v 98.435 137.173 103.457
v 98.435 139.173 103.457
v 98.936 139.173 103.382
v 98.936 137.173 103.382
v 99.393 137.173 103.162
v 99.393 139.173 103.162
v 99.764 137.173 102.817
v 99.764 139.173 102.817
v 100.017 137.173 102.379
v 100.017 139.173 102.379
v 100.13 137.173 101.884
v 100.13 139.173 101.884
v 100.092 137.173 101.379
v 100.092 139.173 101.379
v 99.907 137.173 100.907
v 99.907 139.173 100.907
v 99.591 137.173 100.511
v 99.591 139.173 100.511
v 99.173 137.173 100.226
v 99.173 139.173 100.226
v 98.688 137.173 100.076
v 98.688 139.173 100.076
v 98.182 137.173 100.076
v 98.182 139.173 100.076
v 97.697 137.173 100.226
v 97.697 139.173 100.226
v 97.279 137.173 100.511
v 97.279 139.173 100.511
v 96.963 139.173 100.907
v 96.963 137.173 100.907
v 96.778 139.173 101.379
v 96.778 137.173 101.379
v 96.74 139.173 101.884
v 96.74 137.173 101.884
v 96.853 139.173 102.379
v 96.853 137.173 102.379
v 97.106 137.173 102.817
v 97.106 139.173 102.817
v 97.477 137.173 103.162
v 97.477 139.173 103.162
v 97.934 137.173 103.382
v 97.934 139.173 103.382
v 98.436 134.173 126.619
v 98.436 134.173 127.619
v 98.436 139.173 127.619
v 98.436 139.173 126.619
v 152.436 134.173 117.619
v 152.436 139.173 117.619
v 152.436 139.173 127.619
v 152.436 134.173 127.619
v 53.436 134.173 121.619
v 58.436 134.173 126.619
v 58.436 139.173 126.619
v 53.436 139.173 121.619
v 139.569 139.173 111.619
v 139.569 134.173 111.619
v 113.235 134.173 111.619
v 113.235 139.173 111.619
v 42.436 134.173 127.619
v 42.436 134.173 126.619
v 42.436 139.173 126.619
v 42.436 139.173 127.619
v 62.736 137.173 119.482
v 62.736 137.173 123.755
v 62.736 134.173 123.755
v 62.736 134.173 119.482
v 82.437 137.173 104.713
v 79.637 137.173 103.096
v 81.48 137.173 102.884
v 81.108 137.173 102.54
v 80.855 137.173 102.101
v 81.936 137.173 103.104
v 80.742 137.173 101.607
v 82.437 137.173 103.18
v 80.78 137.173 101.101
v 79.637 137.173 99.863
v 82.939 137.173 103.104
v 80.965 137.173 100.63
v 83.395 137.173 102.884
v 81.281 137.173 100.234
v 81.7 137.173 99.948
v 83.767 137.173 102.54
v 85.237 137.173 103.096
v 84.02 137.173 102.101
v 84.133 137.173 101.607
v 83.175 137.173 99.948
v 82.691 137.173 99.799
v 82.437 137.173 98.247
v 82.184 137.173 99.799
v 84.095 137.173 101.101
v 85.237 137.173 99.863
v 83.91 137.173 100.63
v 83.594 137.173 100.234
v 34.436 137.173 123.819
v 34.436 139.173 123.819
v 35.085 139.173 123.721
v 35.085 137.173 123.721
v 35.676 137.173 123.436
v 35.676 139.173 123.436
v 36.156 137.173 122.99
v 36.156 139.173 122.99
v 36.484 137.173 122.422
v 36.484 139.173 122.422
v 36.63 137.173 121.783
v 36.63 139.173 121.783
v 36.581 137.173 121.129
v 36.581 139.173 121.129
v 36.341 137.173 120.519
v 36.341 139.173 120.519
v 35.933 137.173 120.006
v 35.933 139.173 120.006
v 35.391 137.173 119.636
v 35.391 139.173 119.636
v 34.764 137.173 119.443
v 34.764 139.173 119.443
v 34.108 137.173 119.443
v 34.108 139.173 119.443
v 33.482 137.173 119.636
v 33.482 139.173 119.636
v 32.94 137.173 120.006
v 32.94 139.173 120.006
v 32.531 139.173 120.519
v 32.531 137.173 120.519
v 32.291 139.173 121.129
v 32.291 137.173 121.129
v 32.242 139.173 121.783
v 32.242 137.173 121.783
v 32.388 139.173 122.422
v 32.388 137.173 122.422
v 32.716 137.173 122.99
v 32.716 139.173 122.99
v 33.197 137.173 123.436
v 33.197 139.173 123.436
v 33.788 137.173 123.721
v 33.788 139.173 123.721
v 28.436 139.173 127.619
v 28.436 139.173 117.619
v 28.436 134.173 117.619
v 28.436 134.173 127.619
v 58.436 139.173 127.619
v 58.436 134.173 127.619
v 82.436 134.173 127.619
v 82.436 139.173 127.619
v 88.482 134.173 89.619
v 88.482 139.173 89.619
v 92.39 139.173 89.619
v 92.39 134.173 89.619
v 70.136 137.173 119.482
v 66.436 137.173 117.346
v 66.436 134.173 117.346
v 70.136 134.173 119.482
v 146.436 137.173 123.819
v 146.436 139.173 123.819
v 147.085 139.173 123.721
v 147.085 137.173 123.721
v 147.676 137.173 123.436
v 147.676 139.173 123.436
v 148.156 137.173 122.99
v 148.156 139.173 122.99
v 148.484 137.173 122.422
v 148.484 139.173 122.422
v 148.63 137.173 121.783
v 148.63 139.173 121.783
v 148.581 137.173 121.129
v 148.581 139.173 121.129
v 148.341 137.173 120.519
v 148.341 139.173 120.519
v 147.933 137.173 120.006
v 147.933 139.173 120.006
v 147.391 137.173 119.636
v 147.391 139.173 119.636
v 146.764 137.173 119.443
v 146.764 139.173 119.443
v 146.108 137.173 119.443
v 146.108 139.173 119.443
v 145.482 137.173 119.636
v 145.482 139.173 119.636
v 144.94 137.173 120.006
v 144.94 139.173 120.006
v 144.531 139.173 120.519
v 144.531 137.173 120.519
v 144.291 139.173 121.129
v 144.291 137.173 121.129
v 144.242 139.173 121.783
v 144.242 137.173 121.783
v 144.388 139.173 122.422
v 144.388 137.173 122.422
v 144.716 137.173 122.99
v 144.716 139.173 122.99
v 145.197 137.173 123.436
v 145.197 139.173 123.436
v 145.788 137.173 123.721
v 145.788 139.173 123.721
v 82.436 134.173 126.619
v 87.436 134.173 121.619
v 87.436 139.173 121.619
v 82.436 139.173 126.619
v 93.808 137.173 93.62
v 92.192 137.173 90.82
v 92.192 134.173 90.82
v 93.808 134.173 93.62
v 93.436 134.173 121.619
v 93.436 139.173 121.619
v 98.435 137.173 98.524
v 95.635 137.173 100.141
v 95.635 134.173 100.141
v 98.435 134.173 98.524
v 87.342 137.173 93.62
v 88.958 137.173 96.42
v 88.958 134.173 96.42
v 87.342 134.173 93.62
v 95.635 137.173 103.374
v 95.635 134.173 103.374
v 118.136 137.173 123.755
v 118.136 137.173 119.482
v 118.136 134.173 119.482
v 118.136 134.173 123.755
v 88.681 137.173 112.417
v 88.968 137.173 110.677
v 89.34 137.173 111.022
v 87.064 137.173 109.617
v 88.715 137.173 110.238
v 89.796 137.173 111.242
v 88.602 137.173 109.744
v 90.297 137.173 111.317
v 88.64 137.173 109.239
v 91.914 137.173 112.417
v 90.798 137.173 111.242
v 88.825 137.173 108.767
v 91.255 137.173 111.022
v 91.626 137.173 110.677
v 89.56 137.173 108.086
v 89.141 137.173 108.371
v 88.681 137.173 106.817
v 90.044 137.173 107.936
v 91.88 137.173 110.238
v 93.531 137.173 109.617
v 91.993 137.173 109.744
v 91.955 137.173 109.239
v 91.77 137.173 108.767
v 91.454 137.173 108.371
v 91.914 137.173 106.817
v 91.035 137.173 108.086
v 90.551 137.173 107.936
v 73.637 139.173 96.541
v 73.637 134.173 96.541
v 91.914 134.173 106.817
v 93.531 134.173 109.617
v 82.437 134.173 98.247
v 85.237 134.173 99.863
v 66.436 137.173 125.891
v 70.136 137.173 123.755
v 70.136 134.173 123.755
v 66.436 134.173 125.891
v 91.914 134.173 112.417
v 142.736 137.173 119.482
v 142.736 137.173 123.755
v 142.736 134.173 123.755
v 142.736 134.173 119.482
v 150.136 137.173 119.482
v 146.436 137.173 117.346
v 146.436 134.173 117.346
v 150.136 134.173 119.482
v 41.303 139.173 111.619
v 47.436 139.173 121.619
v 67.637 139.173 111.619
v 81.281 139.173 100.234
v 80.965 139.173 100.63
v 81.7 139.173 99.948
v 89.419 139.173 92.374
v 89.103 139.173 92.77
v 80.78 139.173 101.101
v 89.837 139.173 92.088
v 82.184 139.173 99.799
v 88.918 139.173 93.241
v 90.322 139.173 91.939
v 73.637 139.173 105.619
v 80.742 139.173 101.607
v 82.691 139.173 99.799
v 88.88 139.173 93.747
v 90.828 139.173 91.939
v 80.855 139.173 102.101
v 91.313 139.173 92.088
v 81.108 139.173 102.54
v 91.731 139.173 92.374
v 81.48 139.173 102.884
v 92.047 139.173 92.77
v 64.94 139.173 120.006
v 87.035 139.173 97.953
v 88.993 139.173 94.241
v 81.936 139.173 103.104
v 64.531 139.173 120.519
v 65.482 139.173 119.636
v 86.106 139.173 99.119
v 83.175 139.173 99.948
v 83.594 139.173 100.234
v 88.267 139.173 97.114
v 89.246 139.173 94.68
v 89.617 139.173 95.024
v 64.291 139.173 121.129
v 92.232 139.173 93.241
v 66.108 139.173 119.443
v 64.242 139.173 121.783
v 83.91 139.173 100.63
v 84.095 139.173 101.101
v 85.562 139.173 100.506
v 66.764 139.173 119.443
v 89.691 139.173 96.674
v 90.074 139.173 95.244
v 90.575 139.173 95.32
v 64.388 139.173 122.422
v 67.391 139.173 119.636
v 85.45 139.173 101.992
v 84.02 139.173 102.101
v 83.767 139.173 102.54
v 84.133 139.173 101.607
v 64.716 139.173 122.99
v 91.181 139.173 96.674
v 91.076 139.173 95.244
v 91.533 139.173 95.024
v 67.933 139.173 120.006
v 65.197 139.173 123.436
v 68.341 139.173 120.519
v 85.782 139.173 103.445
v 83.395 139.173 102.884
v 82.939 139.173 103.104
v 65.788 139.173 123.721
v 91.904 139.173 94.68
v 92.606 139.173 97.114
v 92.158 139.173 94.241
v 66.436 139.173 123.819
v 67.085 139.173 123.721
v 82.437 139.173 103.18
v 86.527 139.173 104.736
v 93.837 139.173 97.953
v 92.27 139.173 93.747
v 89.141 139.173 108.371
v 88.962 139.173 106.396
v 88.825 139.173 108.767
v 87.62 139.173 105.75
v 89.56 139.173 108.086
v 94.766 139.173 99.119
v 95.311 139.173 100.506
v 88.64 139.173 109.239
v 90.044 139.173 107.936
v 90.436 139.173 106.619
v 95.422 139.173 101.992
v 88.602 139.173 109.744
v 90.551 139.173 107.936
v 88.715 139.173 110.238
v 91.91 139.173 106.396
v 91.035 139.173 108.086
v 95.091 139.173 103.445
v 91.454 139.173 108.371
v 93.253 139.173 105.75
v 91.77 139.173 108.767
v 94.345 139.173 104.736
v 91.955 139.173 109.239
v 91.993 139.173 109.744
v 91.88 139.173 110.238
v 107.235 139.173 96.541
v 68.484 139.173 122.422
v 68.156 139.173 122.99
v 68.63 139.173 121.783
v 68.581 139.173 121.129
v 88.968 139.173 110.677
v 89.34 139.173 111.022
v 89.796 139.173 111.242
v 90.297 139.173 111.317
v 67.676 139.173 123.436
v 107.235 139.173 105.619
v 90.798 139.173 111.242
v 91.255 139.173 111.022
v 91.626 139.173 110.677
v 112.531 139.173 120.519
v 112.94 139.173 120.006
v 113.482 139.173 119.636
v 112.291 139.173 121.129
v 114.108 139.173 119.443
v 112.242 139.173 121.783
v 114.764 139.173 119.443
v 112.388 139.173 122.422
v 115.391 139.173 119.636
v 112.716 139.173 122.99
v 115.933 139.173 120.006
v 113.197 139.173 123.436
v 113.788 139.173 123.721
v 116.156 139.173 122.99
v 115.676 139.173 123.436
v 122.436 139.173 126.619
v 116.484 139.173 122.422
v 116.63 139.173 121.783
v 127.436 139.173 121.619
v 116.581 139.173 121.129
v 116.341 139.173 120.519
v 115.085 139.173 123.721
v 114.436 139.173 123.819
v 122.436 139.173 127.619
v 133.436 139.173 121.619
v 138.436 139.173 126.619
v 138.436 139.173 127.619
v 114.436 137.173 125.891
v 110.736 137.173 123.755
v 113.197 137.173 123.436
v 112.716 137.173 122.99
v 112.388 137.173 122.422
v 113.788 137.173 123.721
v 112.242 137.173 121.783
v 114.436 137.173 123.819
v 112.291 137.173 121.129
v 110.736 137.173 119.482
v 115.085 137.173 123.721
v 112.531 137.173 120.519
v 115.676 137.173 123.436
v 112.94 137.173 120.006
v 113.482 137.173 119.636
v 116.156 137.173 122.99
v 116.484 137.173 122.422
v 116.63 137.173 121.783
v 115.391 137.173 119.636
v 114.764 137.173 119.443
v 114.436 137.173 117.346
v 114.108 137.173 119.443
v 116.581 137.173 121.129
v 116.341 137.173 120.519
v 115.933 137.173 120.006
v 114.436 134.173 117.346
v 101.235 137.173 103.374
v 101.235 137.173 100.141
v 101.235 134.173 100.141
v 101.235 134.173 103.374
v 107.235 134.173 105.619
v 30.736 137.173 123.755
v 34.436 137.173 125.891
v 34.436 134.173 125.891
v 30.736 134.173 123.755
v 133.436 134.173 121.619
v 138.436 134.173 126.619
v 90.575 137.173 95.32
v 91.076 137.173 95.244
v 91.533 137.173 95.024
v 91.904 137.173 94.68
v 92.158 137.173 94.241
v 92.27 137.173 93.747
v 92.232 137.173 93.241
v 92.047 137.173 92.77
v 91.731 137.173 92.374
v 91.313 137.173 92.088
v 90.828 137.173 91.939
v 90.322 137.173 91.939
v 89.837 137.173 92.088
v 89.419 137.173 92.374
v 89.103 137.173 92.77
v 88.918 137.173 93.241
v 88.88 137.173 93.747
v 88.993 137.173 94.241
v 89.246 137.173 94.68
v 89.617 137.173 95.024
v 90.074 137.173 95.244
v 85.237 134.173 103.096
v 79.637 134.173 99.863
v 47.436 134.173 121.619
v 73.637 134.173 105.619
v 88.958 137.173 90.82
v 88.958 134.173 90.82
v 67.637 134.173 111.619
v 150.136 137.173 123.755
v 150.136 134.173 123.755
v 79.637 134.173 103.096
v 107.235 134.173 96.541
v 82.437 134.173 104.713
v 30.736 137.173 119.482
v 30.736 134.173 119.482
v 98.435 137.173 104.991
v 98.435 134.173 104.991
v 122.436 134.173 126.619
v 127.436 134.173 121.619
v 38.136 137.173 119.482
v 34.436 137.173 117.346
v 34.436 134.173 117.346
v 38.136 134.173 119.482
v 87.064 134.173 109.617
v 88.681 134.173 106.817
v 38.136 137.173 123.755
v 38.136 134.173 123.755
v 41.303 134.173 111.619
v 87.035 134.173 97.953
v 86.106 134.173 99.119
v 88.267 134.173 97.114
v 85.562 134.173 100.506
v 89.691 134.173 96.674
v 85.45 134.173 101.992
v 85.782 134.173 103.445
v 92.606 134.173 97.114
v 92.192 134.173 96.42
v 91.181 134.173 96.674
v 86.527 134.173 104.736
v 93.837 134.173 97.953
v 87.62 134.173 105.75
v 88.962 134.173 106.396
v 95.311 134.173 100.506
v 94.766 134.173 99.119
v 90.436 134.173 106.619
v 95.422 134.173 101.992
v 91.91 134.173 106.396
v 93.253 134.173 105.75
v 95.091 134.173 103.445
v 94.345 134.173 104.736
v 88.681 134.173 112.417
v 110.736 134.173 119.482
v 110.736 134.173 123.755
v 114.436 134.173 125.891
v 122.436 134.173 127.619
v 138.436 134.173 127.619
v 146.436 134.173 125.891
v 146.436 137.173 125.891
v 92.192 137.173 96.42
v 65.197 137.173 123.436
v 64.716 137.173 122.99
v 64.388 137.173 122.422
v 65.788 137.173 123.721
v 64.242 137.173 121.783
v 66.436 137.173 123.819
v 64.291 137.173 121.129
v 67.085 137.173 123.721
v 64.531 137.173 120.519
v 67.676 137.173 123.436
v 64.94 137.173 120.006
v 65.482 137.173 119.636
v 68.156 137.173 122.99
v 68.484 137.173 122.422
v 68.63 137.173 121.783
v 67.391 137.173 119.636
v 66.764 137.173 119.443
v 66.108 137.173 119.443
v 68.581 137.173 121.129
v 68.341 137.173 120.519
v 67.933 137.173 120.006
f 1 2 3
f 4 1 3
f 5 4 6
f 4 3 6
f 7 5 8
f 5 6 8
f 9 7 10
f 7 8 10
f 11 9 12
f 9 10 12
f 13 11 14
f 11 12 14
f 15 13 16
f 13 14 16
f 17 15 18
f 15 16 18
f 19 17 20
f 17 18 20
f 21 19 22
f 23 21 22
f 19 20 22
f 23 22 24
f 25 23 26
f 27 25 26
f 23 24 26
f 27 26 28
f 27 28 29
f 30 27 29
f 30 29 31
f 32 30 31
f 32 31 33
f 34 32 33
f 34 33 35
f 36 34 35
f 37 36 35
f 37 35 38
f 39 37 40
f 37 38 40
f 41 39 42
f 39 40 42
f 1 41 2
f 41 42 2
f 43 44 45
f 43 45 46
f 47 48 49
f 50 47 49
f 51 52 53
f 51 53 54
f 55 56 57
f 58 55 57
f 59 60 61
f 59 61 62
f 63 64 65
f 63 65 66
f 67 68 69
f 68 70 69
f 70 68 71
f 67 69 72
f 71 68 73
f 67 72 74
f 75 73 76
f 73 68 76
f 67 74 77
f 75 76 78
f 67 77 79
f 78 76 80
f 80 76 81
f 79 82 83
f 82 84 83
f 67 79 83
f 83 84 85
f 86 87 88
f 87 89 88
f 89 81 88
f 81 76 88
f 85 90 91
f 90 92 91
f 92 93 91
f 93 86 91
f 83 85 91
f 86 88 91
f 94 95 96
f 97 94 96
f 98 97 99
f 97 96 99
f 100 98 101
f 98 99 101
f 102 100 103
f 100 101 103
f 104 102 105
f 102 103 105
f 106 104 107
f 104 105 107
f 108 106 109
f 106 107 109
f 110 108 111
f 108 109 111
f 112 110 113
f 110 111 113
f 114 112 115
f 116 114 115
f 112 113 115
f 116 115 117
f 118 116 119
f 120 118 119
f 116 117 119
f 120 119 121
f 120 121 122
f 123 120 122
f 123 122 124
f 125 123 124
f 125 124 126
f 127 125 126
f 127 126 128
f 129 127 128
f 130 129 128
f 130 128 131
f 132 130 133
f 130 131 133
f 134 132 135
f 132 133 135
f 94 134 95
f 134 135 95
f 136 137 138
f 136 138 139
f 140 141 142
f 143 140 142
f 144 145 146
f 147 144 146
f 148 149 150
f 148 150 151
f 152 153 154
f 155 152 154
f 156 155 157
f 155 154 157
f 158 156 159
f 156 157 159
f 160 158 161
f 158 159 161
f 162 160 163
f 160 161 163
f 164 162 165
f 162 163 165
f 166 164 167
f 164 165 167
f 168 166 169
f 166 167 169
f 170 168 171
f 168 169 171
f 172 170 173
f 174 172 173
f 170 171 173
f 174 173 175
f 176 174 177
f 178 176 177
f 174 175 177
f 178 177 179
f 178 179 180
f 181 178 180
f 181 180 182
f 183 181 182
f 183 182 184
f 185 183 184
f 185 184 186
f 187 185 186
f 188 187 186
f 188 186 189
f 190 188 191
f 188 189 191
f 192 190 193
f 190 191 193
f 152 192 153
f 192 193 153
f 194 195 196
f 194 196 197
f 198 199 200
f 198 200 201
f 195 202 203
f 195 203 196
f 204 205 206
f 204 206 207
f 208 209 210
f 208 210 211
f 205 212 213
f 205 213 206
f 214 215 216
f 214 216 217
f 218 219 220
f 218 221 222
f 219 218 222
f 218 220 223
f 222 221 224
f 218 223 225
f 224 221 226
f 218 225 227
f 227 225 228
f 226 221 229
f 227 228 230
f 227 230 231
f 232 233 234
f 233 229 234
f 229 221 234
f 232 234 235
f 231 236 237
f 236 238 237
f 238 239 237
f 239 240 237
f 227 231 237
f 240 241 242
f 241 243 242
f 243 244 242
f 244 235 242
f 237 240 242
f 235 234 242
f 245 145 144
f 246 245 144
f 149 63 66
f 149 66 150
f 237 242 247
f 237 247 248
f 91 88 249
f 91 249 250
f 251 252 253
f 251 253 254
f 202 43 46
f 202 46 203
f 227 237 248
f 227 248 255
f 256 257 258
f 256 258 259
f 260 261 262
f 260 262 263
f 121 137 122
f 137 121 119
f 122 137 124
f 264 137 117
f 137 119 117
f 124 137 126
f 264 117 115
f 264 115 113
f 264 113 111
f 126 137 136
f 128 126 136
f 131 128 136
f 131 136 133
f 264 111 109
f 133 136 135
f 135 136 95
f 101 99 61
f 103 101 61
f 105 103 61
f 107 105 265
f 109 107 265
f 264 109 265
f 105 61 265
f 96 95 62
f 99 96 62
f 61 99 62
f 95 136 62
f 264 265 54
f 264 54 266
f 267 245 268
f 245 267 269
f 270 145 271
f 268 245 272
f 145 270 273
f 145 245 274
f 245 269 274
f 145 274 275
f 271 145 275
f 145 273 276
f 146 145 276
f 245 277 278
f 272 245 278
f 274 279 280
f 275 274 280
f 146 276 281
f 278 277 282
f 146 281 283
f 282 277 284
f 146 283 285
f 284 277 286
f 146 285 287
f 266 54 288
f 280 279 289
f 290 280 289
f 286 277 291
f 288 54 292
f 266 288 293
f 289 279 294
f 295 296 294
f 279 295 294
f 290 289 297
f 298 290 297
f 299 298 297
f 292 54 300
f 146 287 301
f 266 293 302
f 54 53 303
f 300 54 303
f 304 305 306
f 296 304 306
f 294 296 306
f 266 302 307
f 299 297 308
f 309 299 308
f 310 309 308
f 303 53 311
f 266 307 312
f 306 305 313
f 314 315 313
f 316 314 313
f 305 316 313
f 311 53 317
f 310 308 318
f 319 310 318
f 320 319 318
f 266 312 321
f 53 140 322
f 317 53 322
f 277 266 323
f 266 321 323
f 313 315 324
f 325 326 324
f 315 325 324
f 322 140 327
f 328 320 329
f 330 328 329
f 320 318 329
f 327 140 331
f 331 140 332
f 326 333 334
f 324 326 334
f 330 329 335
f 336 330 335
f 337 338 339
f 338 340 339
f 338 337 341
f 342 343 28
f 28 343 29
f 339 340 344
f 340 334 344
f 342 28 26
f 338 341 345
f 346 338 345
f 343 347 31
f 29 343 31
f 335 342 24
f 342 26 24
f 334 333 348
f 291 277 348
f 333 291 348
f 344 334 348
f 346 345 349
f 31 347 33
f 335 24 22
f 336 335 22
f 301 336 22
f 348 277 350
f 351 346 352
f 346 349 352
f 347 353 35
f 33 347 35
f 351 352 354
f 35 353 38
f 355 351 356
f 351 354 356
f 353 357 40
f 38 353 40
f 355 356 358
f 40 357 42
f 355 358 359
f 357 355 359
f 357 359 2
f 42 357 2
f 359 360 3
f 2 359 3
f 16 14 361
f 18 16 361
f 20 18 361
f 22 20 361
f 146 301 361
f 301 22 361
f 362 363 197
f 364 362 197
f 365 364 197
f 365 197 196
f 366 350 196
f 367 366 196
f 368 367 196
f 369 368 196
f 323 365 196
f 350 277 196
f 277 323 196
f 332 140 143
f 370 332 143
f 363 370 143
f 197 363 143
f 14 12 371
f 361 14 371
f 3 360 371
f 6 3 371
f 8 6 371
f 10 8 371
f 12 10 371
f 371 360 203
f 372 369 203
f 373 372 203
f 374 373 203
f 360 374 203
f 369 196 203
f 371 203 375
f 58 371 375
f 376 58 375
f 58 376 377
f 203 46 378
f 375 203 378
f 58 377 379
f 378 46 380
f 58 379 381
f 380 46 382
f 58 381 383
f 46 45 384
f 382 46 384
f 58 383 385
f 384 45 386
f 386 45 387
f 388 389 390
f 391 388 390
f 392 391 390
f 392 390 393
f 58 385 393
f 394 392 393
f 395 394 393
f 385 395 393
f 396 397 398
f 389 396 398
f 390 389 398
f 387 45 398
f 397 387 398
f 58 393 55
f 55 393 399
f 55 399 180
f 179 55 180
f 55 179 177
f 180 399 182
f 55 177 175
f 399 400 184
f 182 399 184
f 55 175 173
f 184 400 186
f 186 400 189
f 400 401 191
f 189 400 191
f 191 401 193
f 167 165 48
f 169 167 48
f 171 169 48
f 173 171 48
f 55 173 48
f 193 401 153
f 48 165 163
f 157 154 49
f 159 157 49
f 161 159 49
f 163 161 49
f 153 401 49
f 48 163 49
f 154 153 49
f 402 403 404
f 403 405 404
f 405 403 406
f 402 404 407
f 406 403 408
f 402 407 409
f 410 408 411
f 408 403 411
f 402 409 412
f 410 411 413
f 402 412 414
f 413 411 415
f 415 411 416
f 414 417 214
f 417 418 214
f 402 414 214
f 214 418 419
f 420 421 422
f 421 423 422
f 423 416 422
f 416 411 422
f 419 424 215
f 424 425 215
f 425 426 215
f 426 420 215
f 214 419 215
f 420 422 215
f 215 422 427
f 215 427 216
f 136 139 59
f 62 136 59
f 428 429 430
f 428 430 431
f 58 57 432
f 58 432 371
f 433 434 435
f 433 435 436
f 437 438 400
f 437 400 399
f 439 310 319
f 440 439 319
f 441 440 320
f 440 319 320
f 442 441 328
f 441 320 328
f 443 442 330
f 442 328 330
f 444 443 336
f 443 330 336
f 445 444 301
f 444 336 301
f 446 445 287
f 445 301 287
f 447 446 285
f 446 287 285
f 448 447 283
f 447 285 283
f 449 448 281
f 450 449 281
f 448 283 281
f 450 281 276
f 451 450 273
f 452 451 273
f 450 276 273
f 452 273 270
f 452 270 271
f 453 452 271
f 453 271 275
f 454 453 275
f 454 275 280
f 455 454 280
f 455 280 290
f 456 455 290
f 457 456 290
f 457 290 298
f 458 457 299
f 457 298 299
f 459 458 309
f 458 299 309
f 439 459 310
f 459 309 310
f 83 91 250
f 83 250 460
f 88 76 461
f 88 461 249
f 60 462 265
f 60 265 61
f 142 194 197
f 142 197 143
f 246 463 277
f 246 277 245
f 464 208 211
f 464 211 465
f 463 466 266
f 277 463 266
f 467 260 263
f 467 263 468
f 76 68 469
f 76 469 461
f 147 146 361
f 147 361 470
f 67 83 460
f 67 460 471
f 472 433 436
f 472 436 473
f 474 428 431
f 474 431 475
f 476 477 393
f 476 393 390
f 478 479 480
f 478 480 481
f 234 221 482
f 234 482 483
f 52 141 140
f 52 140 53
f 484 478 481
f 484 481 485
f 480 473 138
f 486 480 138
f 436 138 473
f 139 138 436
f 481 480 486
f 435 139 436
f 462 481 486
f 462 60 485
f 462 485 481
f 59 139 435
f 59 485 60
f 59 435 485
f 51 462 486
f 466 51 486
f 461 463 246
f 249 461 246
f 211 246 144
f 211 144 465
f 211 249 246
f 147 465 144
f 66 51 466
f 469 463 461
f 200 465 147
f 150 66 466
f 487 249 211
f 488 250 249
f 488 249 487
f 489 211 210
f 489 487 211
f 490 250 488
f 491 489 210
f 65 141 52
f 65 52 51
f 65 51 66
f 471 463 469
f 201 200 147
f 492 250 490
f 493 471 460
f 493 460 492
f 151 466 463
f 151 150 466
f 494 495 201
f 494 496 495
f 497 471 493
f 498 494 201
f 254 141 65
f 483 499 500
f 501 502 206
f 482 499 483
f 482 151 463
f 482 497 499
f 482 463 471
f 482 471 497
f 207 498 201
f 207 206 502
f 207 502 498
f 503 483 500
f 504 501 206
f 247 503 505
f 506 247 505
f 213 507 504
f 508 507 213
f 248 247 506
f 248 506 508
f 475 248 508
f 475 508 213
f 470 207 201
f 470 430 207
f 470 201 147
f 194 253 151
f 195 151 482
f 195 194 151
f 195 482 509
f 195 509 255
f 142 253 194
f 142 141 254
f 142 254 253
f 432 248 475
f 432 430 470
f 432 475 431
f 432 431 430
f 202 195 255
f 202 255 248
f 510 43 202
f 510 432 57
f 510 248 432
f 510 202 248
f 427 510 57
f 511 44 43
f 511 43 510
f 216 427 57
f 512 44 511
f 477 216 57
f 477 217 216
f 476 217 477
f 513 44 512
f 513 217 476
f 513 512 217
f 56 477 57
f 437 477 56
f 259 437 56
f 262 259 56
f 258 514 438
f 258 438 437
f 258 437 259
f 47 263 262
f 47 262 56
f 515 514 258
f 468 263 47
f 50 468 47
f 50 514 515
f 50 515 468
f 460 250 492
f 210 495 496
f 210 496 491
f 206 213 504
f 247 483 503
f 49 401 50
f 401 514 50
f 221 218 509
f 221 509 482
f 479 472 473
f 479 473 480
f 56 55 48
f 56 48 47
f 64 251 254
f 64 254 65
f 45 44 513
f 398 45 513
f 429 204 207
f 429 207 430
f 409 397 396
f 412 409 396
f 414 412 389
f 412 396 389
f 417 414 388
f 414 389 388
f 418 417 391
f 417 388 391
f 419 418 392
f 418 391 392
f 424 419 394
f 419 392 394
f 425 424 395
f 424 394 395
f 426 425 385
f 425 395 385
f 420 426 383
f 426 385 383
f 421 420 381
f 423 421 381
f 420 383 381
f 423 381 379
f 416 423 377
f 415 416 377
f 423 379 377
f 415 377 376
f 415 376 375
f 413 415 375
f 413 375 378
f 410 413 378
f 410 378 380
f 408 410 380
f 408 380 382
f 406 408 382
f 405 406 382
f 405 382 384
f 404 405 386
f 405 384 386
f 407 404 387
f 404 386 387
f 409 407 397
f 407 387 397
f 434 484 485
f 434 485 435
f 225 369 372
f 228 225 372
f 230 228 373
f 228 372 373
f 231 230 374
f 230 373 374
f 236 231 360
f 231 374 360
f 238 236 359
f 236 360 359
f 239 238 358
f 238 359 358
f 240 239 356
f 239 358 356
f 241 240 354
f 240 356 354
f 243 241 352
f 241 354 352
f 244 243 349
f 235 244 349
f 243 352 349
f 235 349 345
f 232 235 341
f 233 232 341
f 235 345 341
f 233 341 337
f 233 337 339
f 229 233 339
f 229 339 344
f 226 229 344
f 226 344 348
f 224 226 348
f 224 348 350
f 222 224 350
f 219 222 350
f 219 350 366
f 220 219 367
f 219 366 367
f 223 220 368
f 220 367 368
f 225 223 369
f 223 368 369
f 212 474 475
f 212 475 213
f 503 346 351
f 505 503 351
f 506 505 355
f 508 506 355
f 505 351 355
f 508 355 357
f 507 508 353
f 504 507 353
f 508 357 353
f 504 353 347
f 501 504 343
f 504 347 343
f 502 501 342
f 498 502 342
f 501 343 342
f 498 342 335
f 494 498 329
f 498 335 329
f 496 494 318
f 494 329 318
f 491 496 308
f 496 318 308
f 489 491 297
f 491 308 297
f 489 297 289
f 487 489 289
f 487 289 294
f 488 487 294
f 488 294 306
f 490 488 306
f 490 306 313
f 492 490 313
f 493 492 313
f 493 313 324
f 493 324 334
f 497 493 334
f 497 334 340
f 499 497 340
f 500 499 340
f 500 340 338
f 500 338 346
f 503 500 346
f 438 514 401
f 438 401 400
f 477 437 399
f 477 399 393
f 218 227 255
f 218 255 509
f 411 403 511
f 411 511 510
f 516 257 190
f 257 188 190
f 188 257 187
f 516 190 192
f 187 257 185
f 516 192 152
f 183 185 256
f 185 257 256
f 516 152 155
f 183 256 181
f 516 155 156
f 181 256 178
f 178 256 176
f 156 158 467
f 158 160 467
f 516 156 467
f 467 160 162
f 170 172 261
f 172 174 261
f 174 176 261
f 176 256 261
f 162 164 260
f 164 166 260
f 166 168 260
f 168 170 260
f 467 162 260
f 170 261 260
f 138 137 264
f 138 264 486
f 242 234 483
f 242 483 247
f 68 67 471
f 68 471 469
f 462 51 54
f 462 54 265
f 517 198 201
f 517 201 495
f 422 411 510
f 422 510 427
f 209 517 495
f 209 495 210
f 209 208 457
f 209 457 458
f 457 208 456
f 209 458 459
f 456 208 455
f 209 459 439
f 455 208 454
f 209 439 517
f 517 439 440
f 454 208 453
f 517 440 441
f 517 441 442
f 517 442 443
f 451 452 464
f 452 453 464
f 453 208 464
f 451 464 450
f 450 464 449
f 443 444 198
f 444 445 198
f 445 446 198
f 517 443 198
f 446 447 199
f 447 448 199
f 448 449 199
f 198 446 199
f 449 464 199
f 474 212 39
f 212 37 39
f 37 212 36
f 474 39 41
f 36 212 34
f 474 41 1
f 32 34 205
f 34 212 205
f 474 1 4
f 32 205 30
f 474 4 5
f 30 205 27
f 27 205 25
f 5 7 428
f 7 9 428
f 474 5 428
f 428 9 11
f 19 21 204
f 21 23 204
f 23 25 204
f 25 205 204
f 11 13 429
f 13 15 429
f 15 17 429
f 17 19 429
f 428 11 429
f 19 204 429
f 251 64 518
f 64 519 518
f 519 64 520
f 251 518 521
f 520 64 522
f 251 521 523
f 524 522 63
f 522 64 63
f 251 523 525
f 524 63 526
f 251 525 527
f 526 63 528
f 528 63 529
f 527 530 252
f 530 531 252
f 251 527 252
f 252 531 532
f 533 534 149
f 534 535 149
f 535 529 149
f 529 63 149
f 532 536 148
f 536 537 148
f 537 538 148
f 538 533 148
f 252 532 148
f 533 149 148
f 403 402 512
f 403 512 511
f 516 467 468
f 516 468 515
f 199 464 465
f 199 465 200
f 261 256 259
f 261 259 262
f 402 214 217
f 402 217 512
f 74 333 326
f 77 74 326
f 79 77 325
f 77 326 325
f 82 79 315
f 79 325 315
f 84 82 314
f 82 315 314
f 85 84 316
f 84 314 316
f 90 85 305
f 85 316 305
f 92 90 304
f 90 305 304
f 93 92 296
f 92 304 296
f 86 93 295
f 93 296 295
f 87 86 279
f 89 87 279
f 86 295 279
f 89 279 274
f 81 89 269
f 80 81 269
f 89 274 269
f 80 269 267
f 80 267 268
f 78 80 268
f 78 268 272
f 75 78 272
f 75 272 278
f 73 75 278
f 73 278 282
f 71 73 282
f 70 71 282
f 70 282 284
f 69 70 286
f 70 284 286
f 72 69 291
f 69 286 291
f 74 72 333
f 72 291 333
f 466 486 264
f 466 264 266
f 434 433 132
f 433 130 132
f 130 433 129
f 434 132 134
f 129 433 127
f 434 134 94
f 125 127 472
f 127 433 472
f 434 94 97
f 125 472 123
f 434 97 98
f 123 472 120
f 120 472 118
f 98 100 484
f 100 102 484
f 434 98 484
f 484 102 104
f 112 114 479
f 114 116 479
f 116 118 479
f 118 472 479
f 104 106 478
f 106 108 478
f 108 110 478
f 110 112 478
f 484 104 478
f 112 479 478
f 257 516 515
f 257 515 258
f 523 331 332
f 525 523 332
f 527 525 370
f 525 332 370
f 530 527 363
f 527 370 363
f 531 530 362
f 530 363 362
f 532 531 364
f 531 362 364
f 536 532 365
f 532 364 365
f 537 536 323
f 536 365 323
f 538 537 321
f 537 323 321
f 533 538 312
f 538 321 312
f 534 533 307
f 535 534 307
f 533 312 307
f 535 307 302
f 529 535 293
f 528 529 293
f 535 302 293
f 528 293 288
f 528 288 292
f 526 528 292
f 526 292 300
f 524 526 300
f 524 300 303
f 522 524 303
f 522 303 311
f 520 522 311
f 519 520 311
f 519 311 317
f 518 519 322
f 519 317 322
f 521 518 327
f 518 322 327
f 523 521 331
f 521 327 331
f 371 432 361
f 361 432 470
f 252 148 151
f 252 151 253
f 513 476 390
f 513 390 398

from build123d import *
from OCP.BRepFilletAPI import BRepFilletAPI_MakeChamfer

# Parameters (mm, degrees)
SKETCH1_W           = 124
SKETCH1_H           = 42
BOSS_EXTRUDE1_DEPTH = 5
SKETCH2_R           = 5
CUT_EXTRUDE1_DEPTH  = 5
SKETCH3_W           = 124
SKETCH3_H           = 42
SKETCH3_R           = 2.2
SKETCH3_R_2         = 1.7
SKETCH3_R_3         = 5
BOSS_EXTRUDE2_DEPTH = 2
CHAMFER1_SIZE       = 28
CHAMFER1_SIZE2      = 60.046193774
CUT_EXTRUDE2_DEPTH  = 10
LPATTERN1_COUNT     = 3
LPATTERN1_PITCH     = 40
SKETCH5_W           = 124
SKETCH5_H           = 4
CUT_EXTRUDE3_DEPTH  = 10
CUT_EXTRUDE4_DEPTH  = 10
CHAMFER2_SIZE       = 6


with BuildPart() as part:
    # Sketch1 → Boss-Extrude1 (new body)
    with BuildSketch(Plane.XZ.offset(-139.173467121)):
        with Locations((90.436218841, 110.61857787)):
            Rectangle(SKETCH1_W, SKETCH1_H)
        Polygon((87.341918286, 93.619783108), (88.95849904, 90.819783108), (92.191660547, 90.819783108), (93.808241301, 93.619783108), (92.191660547, 96.419783108), (88.95849904, 96.419783108), align=None, mode=Mode.SUBTRACT)
        Polygon((98.435013602, 98.524277315), (101.235013602, 100.140858069), (101.235013602, 103.374019576), (98.435013602, 104.99060033), (95.635013602, 103.374019576), (95.635013602, 100.140858069), align=None, mode=Mode.SUBTRACT)
        Polygon((82.437424079, 104.712878424), (79.637424079, 103.09629767), (79.637424079, 99.863136163), (82.437424079, 98.246555409), (85.237424079, 99.863136163), (85.237424079, 103.09629767), align=None, mode=Mode.SUBTRACT)
        Polygon((93.530519395, 109.617372631), (91.913938641, 112.417372631), (88.680777134, 112.417372631), (87.06419638, 109.617372631), (88.680777134, 106.817372631), (91.913938641, 106.817372631), align=None, mode=Mode.SUBTRACT)
        Polygon((34.436218841, 125.890969862), (30.736218841, 123.754773866), (30.736218841, 119.482381874), (34.436218841, 117.346185878), (38.136218841, 119.482381874), (38.136218841, 123.754773866), align=None, mode=Mode.SUBTRACT)
        Polygon((62.736218841, 123.754773866), (62.736218841, 119.482381874), (66.436218841, 117.346185878), (70.136218841, 119.482381874), (70.136218841, 123.754773866), (66.436218841, 125.890969862), align=None, mode=Mode.SUBTRACT)
        Polygon((118.136218841, 123.754773866), (114.436218841, 125.890969862), (110.736218841, 123.754773866), (110.736218841, 119.482381874), (114.436218841, 117.346185878), (118.136218841, 119.482381874), align=None, mode=Mode.SUBTRACT)
        Polygon((142.736218841, 119.482381874), (146.436218841, 117.346185878), (150.136218841, 119.482381874), (150.136218841, 123.754773866), (146.436218841, 125.890969862), (142.736218841, 123.754773866), align=None, mode=Mode.SUBTRACT)
    extrude(amount=BOSS_EXTRUDE1_DEPTH)

    # Sketch2 → Cut-Extrude1 (cut)
    with BuildSketch(Plane(origin=(0, 139.173467121, 0), x_dir=(1, 0, 0), z_dir=(0, 1, 0))):
        with Locations(Location((90.436218841, -101.61857787, 0), (0, 0, 270))):
            Circle(SKETCH2_R)
    extrude(amount=-CUT_EXTRUDE1_DEPTH, mode=Mode.SUBTRACT)

    # Sketch3 → Boss-Extrude2 (add)
    with BuildSketch(Plane(origin=(0, 139.173467121, 0), x_dir=(1, 0, 0), z_dir=(0, 1, 0))):
        with Locations((90.436218841, -110.61857787)):
            Rectangle(SKETCH3_W, SKETCH3_H)
        with Locations(Location((34.436218841, -121.61857787, 0), (0, 0, 270))):
            Circle(SKETCH3_R, mode=Mode.SUBTRACT)
        with Locations(Location((66.436218841, -121.61857787, 0), (0, 0, 270))):
            Circle(SKETCH3_R, mode=Mode.SUBTRACT)
        with Locations(Location((114.436218841, -121.61857787, 0), (0, 0, 270))):
            Circle(SKETCH3_R, mode=Mode.SUBTRACT)
        with Locations(Location((146.436218841, -121.61857787, 0), (0, 0, 270))):
            Circle(SKETCH3_R, mode=Mode.SUBTRACT)
        with Locations(Location((90.575079793, -93.619783108, 0), (0, 0, 270))):
            Circle(SKETCH3_R_2, mode=Mode.SUBTRACT)
        with Locations(Location((82.437424079, -101.479716917, 0), (0, 0, 270))):
            Circle(SKETCH3_R_2, mode=Mode.SUBTRACT)
        with Locations(Location((90.297357888, -109.617372631, 0), (0, 0, 270))):
            Circle(SKETCH3_R_2, mode=Mode.SUBTRACT)
        with Locations(Location((98.435013602, -101.757438823, 0), (0, 0, 270))):
            Circle(SKETCH3_R_2, mode=Mode.SUBTRACT)
        with Locations(Location((90.436218841, -101.61857787, 0), (0, 0, 270))):
            Circle(SKETCH3_R_3, mode=Mode.SUBTRACT)
    extrude(amount=-BOSS_EXTRUDE2_DEPTH)

    # Chamfer1: one chamfer whose edges measure the first distance from different faces: ONE call of the kernel's chamfer builder (chamfer() names one face for all edges)
    chamfer1_edges_1 = [part.edges().sort_by_distance(p)[0] for p in [
        (152.436218841, 136.673467121, 89.61857787),
    ]]
    chamfer1_side_1 = [part.faces().sort_by_distance(p)[0] for p in [
        (152.436218841, 136.673467121, 110.61857787),
    ]]
    chamfer1_edges_2 = [part.edges().sort_by_distance(p)[0] for p in [
        (28.436218841, 136.673467121, 89.61857787),
    ]]
    chamfer1_side_2 = [part.faces().sort_by_distance(p)[0] for p in [
        (28.436218841, 136.673467121, 110.61857787),
    ]]
    chamfer1 = BRepFilletAPI_MakeChamfer(part.part.solid().wrapped)
    for e in chamfer1_edges_1:
        chamfer1.Add(CHAMFER1_SIZE, CHAMFER1_SIZE2, e.wrapped, chamfer1_side_1[0].wrapped)  # the first distance lies on this face
    for e in chamfer1_edges_2:
        chamfer1.Add(CHAMFER1_SIZE, CHAMFER1_SIZE2, e.wrapped, chamfer1_side_2[0].wrapped)  # the first distance lies on this face
    add(Compound.cast(chamfer1.Shape()), mode=Mode.REPLACE)

    # Sketch4 → Cut-Extrude2 (cut)
    with BuildSketch(Plane.XZ.offset(-134.173467121)):
        Polygon((42.436218841, 131.61857787), (58.436218841, 131.61857787), (58.436218841, 126.61857787), (53.436218841, 121.61857787), (47.436218841, 121.61857787), (42.436218841, 126.61857787), align=None)
    cut_extrude2 = extrude(amount=-CUT_EXTRUDE2_DEPTH, mode=Mode.SUBTRACT)

    # LPattern1: Cut-Extrude2 ×3
    with Locations(*[(i * LPATTERN1_PITCH, 0, 0) for i in range(1, LPATTERN1_COUNT)]):
        add(cut_extrude2, mode=Mode.SUBTRACT)

    # Sketch5 → Cut-Extrude3 (cut)
    with BuildSketch(Plane.XZ.offset(-134.173467121)):
        with Locations((90.436218841, 129.61857787)):
            Rectangle(SKETCH5_W, SKETCH5_H)
    extrude(amount=-CUT_EXTRUDE3_DEPTH, mode=Mode.SUBTRACT)

    # Sketch6 → Cut-Extrude4 (cut)
    with BuildSketch(Plane.XZ.offset(-134.173467121)):
        Polygon((41.303260364, 111.61857787), (73.637424079, 111.61857787), (73.637424079, 96.540909709), align=None)
        Polygon((107.235013602, 111.61857787), (107.235013602, 96.540909709), (139.569177317, 111.61857787), align=None)
    extrude(amount=-CUT_EXTRUDE4_DEPTH, mode=Mode.SUBTRACT)

    # Chamfer2
    chamfer2_edges = [part.edges().sort_by_distance(p)[0] for p in [
        (73.637424079, 136.673467121, 111.61857787),
        (107.235013602, 136.673467121, 111.61857787),
    ]]
    chamfer(chamfer2_edges, length=CHAMFER2_SIZE)


solid = part.part
